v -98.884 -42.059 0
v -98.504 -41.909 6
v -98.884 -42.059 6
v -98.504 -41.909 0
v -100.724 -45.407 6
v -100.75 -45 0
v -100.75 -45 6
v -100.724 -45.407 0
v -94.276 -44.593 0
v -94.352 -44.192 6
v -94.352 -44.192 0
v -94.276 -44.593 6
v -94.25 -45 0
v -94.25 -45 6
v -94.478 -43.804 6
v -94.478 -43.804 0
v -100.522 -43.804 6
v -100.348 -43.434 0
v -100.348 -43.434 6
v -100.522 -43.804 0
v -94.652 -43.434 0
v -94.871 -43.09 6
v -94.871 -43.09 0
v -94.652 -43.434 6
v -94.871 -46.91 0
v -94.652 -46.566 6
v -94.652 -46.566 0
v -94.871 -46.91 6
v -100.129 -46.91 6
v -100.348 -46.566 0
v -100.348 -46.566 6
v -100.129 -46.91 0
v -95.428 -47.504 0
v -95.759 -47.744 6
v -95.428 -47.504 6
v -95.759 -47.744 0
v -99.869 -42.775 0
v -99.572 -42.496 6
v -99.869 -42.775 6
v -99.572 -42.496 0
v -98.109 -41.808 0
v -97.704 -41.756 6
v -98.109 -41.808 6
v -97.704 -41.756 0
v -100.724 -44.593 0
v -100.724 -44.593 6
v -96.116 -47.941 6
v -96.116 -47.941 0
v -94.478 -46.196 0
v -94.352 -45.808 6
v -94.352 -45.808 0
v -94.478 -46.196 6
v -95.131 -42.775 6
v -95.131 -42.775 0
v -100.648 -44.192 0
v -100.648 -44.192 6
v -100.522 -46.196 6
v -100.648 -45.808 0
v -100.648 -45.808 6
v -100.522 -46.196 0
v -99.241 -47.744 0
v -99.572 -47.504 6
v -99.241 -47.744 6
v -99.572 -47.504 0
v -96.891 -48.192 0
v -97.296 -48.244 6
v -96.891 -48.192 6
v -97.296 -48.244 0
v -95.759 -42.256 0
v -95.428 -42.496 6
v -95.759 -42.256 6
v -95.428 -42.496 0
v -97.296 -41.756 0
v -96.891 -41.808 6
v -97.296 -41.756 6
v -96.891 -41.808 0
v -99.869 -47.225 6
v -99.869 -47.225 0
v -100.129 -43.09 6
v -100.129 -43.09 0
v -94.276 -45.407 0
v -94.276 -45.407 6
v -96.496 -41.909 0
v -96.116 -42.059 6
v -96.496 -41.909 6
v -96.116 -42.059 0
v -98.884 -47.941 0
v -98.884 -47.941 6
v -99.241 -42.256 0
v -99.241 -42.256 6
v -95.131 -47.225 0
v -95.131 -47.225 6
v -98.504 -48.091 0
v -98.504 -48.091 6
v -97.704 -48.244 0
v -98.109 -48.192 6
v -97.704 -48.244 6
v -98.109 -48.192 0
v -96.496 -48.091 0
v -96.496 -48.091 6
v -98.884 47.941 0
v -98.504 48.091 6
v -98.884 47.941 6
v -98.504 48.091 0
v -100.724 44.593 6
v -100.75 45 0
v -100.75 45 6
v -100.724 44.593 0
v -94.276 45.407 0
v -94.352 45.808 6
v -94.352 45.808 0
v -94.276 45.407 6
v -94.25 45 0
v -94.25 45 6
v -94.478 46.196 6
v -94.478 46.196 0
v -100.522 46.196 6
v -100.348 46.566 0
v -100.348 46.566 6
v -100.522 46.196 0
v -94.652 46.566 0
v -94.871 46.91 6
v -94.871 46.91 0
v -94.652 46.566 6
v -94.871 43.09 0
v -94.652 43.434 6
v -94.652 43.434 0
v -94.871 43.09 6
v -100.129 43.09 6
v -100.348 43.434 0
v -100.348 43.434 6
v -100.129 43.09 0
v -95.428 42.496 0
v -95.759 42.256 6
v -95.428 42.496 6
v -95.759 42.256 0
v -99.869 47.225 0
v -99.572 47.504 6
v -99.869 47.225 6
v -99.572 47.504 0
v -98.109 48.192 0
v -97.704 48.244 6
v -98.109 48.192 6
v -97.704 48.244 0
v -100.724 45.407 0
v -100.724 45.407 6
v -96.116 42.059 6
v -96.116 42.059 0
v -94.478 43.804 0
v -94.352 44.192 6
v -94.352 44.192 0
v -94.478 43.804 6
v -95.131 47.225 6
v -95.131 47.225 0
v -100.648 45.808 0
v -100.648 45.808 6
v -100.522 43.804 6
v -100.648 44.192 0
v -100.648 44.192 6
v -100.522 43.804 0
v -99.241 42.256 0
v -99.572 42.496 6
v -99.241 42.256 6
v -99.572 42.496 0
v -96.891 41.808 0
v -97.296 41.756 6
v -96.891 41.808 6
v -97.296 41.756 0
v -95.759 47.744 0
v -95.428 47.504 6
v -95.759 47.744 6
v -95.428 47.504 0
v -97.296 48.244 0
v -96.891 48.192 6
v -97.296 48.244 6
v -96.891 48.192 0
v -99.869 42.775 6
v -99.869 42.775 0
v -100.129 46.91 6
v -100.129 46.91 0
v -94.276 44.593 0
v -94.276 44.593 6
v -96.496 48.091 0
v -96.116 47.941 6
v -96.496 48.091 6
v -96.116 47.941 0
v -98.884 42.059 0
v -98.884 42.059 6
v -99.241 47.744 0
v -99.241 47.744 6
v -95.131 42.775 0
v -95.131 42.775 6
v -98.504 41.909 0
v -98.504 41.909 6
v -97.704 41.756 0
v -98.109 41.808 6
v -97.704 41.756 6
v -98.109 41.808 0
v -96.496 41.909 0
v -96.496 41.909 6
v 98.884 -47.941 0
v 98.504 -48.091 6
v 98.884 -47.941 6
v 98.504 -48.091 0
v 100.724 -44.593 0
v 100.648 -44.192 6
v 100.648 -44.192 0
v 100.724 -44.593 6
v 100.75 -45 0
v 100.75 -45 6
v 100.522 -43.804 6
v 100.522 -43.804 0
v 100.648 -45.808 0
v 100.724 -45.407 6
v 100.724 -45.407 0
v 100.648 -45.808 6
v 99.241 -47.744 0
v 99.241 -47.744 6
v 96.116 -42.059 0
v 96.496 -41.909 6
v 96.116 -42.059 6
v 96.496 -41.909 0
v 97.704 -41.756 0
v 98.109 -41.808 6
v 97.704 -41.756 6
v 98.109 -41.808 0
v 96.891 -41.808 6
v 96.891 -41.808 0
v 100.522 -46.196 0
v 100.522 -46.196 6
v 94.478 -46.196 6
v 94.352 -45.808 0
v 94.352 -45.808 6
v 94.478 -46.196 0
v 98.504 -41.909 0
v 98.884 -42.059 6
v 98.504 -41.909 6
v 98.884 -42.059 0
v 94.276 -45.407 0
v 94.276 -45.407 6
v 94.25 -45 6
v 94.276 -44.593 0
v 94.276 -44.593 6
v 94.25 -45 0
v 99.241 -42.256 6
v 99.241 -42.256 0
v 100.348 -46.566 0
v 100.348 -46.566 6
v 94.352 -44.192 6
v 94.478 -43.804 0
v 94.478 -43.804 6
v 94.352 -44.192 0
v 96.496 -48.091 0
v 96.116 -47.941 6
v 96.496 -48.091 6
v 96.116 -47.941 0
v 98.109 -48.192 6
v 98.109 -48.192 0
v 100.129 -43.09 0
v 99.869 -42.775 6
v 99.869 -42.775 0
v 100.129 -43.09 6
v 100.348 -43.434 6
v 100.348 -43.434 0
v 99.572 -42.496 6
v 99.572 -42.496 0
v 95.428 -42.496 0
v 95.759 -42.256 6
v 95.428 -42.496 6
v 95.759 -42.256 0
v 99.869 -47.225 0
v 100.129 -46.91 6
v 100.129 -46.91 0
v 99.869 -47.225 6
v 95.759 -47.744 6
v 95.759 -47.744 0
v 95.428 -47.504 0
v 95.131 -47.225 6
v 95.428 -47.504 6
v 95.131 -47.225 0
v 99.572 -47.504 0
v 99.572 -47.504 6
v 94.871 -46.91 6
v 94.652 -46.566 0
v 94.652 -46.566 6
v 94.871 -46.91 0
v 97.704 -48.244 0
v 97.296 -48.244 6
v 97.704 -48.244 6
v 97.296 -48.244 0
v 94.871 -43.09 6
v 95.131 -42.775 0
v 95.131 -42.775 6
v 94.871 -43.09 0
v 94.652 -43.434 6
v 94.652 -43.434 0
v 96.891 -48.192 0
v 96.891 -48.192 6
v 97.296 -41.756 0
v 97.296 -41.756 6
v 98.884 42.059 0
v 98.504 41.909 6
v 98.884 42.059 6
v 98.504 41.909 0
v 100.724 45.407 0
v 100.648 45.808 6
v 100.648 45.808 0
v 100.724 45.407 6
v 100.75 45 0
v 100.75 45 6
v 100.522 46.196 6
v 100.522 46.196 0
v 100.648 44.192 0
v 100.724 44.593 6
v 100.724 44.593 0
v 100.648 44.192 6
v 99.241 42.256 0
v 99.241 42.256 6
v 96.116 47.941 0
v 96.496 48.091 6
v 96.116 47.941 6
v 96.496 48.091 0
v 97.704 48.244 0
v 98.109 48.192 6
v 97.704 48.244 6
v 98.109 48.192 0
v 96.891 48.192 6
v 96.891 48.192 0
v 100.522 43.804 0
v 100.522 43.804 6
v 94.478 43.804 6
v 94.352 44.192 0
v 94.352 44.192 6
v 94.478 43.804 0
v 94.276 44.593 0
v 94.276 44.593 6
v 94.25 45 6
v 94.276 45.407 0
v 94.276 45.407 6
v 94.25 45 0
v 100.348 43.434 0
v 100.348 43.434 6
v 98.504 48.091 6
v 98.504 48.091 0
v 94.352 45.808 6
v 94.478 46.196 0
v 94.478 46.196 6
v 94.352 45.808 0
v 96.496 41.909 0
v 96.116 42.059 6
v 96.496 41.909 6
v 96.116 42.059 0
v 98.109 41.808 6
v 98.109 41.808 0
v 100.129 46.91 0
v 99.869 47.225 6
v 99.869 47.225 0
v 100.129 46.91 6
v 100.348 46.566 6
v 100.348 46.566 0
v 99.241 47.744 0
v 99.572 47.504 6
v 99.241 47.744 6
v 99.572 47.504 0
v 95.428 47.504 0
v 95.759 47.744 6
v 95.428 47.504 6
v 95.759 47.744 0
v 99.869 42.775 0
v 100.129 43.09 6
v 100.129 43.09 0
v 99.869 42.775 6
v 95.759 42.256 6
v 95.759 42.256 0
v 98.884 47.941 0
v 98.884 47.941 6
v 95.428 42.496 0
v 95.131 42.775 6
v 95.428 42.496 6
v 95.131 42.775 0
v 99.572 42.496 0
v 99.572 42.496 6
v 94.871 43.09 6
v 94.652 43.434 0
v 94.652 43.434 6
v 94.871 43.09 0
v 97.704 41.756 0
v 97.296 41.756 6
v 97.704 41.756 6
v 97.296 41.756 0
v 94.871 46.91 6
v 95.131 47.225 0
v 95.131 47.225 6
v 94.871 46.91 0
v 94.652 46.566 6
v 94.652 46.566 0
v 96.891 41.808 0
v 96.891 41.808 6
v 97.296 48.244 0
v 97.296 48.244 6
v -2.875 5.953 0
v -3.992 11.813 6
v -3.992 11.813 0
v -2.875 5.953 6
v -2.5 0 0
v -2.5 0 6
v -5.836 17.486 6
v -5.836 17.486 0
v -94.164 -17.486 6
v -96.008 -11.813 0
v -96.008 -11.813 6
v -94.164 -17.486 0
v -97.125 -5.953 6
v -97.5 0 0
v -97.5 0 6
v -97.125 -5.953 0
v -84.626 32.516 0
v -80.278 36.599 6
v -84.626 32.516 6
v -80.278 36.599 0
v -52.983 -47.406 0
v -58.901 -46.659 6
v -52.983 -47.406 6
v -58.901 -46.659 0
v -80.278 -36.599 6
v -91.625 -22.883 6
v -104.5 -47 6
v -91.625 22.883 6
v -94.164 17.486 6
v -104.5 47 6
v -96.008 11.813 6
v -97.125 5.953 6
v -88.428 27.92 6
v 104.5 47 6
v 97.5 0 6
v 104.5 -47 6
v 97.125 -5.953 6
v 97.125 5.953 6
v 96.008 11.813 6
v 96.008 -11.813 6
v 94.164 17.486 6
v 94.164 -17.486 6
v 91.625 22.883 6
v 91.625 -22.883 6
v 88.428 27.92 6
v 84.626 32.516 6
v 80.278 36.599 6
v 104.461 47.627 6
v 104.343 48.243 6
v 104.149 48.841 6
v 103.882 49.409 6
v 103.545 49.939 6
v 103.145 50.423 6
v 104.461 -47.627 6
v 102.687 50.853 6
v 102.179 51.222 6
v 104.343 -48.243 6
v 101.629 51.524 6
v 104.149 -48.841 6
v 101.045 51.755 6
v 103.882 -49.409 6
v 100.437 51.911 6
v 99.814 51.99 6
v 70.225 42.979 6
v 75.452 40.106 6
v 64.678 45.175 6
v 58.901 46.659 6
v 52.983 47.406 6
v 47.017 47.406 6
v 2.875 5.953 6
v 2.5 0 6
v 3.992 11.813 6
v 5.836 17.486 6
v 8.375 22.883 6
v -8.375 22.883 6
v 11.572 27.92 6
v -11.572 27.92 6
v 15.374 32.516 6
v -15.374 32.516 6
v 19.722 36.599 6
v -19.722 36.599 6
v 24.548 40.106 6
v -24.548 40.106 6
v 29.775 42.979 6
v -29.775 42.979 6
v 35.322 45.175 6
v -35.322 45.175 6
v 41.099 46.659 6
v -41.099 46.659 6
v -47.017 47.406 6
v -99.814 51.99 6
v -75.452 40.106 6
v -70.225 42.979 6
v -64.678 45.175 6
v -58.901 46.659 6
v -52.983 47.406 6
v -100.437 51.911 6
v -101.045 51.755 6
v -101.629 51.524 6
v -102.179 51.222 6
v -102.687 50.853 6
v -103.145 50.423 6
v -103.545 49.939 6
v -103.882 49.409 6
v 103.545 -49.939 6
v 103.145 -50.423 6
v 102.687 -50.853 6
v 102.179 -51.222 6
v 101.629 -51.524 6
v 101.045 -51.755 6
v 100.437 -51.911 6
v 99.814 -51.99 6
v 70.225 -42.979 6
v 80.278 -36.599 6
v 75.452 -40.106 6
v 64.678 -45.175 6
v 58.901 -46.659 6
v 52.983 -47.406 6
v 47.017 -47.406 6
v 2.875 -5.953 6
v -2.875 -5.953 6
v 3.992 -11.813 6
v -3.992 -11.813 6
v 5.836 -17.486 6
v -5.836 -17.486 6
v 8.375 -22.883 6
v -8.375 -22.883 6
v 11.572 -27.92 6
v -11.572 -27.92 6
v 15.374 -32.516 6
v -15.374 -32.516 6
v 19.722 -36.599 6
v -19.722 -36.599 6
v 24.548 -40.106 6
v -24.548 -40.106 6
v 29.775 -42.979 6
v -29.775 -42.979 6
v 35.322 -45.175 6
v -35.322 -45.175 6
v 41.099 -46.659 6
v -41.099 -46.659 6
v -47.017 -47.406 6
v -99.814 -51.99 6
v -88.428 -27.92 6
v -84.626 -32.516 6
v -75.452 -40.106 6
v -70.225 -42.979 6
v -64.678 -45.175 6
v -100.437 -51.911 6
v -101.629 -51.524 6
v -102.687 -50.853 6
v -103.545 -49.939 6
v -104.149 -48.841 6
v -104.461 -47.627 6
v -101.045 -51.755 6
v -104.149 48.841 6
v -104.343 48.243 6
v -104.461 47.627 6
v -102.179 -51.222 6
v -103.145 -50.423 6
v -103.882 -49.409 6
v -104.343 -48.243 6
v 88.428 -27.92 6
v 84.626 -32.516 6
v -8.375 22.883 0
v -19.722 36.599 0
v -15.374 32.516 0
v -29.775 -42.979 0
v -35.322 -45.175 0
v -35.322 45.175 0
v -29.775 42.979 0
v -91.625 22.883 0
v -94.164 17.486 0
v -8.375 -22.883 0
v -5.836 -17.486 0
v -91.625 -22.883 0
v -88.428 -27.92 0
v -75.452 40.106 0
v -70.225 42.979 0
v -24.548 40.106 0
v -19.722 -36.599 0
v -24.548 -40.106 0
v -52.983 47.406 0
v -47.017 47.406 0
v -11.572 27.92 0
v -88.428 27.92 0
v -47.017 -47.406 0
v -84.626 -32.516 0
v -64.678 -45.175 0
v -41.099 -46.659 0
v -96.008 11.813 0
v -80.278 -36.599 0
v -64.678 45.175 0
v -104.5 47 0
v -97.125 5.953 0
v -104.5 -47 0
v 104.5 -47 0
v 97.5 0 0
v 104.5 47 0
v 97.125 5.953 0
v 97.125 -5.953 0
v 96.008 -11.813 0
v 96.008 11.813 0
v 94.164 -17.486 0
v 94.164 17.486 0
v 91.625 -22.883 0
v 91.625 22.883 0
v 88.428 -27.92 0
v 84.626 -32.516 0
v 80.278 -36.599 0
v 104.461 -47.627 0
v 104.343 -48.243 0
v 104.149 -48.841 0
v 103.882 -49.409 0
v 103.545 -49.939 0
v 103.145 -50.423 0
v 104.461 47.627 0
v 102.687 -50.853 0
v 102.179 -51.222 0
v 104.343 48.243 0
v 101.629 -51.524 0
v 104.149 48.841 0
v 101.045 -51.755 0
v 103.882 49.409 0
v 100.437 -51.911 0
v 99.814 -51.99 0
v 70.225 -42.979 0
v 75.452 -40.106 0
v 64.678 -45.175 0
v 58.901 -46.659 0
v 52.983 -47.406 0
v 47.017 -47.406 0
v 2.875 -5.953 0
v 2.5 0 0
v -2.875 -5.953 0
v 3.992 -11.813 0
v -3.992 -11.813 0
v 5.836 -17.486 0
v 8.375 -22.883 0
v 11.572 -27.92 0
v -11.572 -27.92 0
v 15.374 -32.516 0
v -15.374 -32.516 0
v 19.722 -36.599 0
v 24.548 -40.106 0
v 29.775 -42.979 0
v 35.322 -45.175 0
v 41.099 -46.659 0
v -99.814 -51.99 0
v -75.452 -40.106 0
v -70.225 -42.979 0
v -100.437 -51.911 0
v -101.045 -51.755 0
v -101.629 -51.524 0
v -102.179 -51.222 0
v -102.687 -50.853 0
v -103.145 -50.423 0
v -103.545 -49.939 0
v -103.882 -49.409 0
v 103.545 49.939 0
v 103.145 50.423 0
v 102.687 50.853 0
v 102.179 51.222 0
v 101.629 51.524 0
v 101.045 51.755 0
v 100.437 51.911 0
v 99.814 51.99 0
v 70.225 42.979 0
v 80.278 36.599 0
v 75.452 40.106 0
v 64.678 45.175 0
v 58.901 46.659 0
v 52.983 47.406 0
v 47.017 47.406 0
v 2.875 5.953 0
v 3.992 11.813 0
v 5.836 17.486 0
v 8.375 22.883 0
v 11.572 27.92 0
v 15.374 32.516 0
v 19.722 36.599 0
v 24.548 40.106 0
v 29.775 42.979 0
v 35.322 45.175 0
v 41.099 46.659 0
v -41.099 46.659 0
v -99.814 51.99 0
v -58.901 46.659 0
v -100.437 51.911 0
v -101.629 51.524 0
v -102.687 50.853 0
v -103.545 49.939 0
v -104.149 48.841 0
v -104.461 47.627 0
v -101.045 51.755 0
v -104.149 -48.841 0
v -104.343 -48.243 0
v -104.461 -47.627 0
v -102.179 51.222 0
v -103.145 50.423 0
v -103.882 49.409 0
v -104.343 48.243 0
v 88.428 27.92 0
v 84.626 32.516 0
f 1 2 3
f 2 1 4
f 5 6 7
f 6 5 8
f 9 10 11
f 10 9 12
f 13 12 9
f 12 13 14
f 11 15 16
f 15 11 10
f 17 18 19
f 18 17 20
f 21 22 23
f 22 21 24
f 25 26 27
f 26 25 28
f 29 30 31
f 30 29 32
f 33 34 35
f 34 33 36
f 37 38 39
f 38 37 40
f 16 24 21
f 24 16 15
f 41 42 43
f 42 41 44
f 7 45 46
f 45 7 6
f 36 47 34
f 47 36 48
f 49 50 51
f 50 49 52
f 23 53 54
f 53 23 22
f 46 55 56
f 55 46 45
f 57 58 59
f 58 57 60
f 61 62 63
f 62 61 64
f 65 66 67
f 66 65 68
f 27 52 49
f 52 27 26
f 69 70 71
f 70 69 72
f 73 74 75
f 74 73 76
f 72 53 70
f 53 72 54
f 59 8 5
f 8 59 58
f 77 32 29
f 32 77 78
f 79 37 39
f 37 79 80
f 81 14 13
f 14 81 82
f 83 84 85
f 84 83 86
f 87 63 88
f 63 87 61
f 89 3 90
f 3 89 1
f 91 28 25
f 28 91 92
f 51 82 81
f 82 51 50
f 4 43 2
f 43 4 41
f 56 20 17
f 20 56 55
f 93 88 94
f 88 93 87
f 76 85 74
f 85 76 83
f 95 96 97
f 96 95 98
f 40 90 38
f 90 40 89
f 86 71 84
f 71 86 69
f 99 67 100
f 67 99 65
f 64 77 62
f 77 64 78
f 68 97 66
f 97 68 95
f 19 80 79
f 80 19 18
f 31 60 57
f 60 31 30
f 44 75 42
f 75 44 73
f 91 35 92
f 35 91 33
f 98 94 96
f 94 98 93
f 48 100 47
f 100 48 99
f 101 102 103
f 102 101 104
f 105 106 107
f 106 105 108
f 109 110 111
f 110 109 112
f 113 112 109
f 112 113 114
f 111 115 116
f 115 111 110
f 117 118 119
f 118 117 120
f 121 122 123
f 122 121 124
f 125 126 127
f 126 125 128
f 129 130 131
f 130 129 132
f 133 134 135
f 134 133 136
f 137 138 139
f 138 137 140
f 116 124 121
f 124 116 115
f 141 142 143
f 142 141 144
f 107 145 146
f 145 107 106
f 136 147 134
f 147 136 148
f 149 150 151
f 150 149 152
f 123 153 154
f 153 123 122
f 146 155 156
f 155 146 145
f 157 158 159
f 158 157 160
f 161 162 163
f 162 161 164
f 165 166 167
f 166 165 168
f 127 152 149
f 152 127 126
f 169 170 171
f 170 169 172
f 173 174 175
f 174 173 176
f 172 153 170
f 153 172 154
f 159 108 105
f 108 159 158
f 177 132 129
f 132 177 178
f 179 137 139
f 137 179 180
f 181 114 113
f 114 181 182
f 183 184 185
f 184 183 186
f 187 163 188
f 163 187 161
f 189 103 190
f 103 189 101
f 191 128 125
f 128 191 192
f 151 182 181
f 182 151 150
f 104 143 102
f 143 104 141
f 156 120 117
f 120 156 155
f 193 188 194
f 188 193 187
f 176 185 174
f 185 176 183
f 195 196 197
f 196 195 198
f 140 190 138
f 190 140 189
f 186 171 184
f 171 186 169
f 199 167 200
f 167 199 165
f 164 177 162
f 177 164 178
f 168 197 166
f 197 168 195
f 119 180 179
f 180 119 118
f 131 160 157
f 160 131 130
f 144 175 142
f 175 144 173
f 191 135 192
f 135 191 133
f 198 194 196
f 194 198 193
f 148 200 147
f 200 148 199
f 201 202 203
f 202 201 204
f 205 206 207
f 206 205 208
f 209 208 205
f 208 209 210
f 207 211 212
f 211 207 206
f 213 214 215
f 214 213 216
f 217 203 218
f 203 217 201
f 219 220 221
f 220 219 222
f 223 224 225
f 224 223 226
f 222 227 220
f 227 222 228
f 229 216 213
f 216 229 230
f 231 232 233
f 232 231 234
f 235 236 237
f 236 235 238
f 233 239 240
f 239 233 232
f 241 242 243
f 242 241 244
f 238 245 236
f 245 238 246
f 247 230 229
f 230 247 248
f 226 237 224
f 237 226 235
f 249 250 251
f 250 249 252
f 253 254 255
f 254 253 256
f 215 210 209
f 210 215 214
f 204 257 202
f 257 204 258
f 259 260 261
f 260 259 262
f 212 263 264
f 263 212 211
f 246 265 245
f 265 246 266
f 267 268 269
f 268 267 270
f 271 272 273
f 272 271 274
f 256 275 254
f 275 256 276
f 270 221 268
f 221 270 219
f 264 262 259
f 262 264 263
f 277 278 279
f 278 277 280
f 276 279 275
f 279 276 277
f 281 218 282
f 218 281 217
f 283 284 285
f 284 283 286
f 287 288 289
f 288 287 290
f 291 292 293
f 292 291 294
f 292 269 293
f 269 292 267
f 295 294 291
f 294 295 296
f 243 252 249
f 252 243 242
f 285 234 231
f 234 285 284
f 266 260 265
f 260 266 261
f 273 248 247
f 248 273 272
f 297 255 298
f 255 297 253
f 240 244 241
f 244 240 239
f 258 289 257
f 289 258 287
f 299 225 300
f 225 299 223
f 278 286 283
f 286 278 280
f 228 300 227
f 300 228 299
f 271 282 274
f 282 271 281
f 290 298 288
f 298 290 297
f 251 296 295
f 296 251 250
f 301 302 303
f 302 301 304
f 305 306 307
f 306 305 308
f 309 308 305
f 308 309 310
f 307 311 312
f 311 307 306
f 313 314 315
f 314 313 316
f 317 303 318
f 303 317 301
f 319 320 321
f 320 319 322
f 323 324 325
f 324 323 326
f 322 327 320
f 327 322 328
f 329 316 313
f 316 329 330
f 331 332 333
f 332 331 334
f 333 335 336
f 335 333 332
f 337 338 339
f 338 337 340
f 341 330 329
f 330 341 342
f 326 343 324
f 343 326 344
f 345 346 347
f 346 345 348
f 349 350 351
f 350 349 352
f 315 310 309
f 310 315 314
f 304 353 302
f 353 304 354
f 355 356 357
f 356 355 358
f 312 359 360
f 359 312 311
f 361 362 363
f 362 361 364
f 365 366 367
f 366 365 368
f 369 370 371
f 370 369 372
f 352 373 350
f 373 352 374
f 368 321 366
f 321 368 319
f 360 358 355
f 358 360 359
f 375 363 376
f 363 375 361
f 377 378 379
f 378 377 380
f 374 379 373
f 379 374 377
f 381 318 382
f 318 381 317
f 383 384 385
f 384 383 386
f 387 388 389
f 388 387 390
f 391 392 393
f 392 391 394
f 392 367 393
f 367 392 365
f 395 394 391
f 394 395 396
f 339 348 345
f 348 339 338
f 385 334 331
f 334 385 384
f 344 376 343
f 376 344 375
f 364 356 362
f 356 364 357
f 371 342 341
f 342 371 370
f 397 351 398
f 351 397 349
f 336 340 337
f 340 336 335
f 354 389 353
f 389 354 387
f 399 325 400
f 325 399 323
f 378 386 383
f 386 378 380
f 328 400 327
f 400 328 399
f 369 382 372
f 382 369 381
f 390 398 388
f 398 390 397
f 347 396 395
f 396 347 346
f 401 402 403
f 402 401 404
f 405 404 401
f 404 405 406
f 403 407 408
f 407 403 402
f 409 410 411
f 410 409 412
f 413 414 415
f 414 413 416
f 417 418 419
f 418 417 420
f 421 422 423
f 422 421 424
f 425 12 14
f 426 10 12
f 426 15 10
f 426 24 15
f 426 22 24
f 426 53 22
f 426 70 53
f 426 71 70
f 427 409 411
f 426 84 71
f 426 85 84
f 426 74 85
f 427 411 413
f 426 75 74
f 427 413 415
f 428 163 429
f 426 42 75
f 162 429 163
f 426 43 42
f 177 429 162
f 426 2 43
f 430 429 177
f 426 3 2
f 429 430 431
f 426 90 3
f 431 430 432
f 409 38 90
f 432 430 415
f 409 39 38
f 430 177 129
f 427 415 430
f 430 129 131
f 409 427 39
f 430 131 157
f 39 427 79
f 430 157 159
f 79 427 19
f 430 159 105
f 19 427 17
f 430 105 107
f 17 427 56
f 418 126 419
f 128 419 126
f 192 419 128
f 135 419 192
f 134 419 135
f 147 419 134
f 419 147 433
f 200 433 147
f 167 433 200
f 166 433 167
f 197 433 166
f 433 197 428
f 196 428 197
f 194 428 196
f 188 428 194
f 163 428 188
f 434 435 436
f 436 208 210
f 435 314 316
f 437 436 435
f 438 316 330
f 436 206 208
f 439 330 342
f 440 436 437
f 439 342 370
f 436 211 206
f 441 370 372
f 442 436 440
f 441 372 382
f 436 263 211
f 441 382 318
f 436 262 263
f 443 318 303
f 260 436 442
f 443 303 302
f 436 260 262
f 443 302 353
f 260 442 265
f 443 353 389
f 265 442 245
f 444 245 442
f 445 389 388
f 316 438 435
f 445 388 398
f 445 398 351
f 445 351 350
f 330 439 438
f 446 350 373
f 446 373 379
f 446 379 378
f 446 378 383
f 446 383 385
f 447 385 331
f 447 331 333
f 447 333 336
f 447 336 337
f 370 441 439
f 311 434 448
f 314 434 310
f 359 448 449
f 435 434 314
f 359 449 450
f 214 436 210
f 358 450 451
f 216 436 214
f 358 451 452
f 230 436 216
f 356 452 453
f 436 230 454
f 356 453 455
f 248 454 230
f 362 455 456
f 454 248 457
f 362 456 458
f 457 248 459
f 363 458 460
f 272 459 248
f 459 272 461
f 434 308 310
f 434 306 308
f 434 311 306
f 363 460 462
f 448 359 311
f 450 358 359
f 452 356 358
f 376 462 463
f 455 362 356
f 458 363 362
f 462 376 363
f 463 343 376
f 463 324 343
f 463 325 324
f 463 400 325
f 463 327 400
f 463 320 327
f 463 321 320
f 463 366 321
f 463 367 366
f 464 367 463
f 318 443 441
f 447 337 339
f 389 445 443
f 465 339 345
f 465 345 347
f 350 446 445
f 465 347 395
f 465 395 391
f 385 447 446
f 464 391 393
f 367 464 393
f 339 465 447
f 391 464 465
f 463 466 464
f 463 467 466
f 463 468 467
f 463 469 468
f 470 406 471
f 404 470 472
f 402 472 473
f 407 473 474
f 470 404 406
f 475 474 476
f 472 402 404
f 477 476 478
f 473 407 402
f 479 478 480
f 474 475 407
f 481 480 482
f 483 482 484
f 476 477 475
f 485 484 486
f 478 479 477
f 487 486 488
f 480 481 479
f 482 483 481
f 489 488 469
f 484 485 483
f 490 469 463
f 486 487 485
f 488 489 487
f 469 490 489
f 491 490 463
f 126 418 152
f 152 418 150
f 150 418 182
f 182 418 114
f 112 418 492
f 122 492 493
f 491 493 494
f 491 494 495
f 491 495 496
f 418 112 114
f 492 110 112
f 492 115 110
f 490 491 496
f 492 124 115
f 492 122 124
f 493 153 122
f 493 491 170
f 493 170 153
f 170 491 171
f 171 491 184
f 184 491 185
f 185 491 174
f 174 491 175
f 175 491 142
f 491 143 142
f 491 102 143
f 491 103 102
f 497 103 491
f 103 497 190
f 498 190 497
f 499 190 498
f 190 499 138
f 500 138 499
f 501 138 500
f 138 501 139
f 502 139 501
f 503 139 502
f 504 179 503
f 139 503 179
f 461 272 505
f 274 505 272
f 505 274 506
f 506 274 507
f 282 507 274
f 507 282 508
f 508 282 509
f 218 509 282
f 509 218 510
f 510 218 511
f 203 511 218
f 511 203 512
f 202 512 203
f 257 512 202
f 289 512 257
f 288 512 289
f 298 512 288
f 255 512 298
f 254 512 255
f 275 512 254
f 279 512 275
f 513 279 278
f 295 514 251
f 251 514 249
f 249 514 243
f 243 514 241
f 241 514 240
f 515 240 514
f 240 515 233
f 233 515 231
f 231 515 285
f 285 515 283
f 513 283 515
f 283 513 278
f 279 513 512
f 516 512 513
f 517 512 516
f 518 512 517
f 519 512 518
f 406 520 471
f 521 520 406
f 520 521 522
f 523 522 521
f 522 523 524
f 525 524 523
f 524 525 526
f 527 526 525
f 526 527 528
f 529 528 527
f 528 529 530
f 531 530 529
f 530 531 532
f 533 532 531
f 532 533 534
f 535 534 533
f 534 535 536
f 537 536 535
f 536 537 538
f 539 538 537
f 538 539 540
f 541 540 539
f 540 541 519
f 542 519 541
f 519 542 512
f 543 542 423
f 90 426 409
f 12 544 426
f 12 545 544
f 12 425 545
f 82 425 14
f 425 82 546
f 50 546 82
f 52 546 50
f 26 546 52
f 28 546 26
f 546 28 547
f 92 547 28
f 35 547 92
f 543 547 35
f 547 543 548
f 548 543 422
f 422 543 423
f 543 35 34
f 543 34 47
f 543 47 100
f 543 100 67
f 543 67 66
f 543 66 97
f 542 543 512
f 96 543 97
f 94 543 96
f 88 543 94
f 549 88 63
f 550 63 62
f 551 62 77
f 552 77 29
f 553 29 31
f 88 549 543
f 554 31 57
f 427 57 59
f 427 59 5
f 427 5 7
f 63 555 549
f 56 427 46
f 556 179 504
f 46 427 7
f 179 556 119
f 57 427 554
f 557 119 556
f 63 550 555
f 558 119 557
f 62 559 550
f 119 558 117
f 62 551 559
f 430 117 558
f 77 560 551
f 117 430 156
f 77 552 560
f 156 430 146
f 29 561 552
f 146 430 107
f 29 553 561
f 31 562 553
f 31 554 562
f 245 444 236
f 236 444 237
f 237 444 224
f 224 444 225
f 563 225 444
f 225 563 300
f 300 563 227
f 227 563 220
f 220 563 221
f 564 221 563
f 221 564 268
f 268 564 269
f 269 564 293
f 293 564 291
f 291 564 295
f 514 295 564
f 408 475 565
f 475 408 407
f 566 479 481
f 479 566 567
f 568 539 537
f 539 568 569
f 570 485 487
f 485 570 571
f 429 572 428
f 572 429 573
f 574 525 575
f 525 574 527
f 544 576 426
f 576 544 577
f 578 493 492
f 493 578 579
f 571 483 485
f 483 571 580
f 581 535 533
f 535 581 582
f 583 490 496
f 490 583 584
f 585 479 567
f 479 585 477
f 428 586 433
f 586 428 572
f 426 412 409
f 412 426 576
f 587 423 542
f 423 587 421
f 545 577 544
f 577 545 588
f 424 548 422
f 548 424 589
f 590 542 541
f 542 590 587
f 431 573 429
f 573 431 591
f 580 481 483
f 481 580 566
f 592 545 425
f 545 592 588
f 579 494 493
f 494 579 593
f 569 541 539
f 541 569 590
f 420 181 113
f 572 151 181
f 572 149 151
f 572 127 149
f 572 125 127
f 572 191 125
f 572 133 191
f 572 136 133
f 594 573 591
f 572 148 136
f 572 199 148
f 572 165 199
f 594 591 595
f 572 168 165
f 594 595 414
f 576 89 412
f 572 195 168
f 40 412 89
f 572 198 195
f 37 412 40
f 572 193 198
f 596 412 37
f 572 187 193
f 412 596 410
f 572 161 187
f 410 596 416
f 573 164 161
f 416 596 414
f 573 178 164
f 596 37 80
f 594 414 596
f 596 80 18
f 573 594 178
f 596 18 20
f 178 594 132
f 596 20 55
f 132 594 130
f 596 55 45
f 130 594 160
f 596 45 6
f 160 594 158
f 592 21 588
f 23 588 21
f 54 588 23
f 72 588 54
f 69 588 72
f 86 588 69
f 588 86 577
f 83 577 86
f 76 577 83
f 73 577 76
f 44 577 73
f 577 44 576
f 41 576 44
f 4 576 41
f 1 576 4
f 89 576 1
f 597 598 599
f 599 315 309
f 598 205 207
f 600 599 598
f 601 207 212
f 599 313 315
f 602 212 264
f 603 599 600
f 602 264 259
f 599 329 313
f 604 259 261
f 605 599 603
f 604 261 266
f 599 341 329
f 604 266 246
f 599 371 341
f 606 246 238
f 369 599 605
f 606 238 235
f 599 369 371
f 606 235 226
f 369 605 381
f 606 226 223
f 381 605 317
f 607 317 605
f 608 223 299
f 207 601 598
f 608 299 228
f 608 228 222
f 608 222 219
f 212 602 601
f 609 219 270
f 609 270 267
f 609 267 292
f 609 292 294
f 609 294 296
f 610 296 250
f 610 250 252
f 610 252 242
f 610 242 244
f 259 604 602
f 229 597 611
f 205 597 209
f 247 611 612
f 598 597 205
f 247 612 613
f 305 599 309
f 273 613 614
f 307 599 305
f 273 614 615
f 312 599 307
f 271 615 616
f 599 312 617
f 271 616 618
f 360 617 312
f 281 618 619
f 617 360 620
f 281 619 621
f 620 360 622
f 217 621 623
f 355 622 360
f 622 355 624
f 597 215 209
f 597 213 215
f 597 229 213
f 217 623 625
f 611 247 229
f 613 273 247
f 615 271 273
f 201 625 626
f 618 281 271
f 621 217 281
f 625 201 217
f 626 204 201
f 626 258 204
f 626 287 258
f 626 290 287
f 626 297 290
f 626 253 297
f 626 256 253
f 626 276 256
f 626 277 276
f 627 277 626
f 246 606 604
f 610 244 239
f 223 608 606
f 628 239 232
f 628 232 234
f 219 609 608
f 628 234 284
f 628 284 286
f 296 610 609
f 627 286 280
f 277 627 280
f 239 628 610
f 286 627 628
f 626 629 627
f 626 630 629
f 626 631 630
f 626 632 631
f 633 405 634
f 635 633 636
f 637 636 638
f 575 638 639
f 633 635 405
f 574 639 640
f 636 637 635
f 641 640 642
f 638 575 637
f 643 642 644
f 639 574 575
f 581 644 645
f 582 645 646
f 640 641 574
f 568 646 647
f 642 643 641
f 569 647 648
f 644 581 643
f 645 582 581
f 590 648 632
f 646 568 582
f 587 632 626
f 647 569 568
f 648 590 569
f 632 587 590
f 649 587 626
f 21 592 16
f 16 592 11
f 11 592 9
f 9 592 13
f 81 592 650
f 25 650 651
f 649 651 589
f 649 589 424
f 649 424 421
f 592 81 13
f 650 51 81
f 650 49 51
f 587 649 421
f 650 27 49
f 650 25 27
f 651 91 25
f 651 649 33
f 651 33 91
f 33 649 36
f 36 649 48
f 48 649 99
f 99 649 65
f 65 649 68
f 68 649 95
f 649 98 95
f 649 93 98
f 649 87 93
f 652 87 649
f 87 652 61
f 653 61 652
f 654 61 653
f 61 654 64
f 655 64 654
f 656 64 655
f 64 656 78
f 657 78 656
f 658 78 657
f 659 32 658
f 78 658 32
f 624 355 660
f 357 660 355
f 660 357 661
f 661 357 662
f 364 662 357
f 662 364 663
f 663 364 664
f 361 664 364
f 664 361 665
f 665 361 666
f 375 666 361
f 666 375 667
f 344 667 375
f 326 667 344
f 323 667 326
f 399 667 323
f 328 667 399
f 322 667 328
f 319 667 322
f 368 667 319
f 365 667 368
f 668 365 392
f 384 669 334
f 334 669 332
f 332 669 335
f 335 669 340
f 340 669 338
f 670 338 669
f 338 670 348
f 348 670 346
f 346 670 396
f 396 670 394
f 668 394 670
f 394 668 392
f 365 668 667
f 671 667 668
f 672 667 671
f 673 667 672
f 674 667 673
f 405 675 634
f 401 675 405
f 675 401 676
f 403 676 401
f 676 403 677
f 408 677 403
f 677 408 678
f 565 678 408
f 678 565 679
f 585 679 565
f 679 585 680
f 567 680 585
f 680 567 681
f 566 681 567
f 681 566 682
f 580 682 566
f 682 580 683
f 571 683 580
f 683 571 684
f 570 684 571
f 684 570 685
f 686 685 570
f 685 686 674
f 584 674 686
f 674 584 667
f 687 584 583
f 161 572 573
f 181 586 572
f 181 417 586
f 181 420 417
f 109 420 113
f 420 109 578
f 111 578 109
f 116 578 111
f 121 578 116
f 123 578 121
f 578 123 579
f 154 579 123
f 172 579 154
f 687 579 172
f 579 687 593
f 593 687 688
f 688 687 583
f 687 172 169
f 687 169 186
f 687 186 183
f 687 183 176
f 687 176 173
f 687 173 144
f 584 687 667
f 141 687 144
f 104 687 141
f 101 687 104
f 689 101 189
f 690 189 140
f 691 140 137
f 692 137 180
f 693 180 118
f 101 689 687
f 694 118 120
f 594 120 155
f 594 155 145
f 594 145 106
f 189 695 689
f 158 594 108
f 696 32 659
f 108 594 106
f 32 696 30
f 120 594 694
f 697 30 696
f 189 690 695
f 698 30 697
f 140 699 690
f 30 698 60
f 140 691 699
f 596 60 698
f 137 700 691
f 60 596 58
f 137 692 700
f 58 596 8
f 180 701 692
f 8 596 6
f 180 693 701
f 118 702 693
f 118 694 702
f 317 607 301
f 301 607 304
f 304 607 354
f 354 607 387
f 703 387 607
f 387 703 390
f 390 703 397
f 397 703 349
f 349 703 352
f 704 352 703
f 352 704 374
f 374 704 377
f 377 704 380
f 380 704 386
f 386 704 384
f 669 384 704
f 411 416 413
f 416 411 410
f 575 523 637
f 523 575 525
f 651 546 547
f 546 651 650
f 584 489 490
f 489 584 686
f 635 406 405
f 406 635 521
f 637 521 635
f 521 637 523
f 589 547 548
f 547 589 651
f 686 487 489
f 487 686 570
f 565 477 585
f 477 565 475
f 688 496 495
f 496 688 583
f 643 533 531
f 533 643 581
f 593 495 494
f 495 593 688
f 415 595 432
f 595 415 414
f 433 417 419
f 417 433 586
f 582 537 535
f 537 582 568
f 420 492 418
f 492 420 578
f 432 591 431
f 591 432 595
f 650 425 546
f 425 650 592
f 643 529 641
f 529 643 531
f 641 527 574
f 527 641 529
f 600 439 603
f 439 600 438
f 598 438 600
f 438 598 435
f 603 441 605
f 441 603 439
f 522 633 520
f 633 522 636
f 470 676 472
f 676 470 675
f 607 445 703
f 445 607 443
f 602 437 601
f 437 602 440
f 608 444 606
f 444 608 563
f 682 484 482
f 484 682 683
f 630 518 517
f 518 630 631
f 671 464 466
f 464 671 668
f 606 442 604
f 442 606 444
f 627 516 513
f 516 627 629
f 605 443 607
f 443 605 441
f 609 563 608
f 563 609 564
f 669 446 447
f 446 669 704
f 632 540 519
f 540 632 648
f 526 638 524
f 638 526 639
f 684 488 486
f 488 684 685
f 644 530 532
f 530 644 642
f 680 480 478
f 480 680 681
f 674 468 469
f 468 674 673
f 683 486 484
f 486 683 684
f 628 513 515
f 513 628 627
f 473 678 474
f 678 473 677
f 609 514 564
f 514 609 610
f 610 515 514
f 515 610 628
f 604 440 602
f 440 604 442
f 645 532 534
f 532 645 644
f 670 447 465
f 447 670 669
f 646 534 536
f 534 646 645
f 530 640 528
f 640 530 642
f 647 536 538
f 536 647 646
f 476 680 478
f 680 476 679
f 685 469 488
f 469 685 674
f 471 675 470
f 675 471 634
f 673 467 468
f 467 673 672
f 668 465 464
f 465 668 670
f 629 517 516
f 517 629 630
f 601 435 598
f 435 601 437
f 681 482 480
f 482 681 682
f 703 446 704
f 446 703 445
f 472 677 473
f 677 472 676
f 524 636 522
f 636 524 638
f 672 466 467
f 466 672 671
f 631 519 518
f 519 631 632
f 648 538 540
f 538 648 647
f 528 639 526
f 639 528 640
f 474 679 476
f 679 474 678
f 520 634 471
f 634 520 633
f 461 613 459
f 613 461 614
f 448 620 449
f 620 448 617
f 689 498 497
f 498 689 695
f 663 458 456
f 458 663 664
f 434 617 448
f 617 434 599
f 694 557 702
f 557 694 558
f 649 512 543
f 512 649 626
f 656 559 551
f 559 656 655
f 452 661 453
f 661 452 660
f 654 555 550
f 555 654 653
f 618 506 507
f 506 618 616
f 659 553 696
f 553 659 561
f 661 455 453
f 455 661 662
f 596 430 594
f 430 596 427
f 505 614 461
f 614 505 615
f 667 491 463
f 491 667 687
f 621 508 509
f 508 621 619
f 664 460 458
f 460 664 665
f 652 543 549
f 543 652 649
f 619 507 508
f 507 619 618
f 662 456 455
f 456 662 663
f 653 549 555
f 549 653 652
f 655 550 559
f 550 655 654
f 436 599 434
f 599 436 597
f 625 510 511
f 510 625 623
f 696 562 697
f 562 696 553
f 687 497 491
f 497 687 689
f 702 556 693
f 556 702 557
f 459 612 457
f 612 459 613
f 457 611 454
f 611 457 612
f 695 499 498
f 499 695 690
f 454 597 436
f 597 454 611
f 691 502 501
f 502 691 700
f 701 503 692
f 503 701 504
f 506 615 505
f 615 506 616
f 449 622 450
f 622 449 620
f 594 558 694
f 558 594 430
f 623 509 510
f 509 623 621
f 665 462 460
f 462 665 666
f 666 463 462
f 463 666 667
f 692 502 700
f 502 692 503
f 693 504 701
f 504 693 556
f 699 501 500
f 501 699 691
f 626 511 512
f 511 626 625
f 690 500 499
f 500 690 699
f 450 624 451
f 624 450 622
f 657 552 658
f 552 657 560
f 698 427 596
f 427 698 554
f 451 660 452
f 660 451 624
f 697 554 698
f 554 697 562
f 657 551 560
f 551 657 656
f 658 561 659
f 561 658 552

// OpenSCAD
$fn = 50;


difference() {
	union() {
		hull() {
			translate(v = [-99.5000000000, 47.0000000000, 0]) {
				cylinder(h = 6, r = 5);
			}
			translate(v = [99.5000000000, 47.0000000000, 0]) {
				cylinder(h = 6, r = 5);
			}
			translate(v = [-99.5000000000, -47.0000000000, 0]) {
				cylinder(h = 6, r = 5);
			}
			translate(v = [99.5000000000, -47.0000000000, 0]) {
				cylinder(h = 6, r = 5);
			}
		}
	}
	union() {
		#translate(v = [-97.5000000000, -45.0000000000, -100.0000000000]) {
			cylinder(h = 200, r = 3.2500000000);
		}
		#translate(v = [-97.5000000000, 45.0000000000, -100.0000000000]) {
			cylinder(h = 200, r = 3.2500000000);
		}
		#translate(v = [97.5000000000, -45.0000000000, -100.0000000000]) {
			cylinder(h = 200, r = 3.2500000000);
		}
		#translate(v = [97.5000000000, 45.0000000000, -100.0000000000]) {
			cylinder(h = 200, r = 3.2500000000);
		}
		#translate(v = [-50.0000000000, 0, 0]) {
			cylinder(h = 6, r = 47.5000000000);
		}
		#translate(v = [50.0000000000, 0, 0]) {
			cylinder(h = 6, r = 47.5000000000);
		}
	}
}
